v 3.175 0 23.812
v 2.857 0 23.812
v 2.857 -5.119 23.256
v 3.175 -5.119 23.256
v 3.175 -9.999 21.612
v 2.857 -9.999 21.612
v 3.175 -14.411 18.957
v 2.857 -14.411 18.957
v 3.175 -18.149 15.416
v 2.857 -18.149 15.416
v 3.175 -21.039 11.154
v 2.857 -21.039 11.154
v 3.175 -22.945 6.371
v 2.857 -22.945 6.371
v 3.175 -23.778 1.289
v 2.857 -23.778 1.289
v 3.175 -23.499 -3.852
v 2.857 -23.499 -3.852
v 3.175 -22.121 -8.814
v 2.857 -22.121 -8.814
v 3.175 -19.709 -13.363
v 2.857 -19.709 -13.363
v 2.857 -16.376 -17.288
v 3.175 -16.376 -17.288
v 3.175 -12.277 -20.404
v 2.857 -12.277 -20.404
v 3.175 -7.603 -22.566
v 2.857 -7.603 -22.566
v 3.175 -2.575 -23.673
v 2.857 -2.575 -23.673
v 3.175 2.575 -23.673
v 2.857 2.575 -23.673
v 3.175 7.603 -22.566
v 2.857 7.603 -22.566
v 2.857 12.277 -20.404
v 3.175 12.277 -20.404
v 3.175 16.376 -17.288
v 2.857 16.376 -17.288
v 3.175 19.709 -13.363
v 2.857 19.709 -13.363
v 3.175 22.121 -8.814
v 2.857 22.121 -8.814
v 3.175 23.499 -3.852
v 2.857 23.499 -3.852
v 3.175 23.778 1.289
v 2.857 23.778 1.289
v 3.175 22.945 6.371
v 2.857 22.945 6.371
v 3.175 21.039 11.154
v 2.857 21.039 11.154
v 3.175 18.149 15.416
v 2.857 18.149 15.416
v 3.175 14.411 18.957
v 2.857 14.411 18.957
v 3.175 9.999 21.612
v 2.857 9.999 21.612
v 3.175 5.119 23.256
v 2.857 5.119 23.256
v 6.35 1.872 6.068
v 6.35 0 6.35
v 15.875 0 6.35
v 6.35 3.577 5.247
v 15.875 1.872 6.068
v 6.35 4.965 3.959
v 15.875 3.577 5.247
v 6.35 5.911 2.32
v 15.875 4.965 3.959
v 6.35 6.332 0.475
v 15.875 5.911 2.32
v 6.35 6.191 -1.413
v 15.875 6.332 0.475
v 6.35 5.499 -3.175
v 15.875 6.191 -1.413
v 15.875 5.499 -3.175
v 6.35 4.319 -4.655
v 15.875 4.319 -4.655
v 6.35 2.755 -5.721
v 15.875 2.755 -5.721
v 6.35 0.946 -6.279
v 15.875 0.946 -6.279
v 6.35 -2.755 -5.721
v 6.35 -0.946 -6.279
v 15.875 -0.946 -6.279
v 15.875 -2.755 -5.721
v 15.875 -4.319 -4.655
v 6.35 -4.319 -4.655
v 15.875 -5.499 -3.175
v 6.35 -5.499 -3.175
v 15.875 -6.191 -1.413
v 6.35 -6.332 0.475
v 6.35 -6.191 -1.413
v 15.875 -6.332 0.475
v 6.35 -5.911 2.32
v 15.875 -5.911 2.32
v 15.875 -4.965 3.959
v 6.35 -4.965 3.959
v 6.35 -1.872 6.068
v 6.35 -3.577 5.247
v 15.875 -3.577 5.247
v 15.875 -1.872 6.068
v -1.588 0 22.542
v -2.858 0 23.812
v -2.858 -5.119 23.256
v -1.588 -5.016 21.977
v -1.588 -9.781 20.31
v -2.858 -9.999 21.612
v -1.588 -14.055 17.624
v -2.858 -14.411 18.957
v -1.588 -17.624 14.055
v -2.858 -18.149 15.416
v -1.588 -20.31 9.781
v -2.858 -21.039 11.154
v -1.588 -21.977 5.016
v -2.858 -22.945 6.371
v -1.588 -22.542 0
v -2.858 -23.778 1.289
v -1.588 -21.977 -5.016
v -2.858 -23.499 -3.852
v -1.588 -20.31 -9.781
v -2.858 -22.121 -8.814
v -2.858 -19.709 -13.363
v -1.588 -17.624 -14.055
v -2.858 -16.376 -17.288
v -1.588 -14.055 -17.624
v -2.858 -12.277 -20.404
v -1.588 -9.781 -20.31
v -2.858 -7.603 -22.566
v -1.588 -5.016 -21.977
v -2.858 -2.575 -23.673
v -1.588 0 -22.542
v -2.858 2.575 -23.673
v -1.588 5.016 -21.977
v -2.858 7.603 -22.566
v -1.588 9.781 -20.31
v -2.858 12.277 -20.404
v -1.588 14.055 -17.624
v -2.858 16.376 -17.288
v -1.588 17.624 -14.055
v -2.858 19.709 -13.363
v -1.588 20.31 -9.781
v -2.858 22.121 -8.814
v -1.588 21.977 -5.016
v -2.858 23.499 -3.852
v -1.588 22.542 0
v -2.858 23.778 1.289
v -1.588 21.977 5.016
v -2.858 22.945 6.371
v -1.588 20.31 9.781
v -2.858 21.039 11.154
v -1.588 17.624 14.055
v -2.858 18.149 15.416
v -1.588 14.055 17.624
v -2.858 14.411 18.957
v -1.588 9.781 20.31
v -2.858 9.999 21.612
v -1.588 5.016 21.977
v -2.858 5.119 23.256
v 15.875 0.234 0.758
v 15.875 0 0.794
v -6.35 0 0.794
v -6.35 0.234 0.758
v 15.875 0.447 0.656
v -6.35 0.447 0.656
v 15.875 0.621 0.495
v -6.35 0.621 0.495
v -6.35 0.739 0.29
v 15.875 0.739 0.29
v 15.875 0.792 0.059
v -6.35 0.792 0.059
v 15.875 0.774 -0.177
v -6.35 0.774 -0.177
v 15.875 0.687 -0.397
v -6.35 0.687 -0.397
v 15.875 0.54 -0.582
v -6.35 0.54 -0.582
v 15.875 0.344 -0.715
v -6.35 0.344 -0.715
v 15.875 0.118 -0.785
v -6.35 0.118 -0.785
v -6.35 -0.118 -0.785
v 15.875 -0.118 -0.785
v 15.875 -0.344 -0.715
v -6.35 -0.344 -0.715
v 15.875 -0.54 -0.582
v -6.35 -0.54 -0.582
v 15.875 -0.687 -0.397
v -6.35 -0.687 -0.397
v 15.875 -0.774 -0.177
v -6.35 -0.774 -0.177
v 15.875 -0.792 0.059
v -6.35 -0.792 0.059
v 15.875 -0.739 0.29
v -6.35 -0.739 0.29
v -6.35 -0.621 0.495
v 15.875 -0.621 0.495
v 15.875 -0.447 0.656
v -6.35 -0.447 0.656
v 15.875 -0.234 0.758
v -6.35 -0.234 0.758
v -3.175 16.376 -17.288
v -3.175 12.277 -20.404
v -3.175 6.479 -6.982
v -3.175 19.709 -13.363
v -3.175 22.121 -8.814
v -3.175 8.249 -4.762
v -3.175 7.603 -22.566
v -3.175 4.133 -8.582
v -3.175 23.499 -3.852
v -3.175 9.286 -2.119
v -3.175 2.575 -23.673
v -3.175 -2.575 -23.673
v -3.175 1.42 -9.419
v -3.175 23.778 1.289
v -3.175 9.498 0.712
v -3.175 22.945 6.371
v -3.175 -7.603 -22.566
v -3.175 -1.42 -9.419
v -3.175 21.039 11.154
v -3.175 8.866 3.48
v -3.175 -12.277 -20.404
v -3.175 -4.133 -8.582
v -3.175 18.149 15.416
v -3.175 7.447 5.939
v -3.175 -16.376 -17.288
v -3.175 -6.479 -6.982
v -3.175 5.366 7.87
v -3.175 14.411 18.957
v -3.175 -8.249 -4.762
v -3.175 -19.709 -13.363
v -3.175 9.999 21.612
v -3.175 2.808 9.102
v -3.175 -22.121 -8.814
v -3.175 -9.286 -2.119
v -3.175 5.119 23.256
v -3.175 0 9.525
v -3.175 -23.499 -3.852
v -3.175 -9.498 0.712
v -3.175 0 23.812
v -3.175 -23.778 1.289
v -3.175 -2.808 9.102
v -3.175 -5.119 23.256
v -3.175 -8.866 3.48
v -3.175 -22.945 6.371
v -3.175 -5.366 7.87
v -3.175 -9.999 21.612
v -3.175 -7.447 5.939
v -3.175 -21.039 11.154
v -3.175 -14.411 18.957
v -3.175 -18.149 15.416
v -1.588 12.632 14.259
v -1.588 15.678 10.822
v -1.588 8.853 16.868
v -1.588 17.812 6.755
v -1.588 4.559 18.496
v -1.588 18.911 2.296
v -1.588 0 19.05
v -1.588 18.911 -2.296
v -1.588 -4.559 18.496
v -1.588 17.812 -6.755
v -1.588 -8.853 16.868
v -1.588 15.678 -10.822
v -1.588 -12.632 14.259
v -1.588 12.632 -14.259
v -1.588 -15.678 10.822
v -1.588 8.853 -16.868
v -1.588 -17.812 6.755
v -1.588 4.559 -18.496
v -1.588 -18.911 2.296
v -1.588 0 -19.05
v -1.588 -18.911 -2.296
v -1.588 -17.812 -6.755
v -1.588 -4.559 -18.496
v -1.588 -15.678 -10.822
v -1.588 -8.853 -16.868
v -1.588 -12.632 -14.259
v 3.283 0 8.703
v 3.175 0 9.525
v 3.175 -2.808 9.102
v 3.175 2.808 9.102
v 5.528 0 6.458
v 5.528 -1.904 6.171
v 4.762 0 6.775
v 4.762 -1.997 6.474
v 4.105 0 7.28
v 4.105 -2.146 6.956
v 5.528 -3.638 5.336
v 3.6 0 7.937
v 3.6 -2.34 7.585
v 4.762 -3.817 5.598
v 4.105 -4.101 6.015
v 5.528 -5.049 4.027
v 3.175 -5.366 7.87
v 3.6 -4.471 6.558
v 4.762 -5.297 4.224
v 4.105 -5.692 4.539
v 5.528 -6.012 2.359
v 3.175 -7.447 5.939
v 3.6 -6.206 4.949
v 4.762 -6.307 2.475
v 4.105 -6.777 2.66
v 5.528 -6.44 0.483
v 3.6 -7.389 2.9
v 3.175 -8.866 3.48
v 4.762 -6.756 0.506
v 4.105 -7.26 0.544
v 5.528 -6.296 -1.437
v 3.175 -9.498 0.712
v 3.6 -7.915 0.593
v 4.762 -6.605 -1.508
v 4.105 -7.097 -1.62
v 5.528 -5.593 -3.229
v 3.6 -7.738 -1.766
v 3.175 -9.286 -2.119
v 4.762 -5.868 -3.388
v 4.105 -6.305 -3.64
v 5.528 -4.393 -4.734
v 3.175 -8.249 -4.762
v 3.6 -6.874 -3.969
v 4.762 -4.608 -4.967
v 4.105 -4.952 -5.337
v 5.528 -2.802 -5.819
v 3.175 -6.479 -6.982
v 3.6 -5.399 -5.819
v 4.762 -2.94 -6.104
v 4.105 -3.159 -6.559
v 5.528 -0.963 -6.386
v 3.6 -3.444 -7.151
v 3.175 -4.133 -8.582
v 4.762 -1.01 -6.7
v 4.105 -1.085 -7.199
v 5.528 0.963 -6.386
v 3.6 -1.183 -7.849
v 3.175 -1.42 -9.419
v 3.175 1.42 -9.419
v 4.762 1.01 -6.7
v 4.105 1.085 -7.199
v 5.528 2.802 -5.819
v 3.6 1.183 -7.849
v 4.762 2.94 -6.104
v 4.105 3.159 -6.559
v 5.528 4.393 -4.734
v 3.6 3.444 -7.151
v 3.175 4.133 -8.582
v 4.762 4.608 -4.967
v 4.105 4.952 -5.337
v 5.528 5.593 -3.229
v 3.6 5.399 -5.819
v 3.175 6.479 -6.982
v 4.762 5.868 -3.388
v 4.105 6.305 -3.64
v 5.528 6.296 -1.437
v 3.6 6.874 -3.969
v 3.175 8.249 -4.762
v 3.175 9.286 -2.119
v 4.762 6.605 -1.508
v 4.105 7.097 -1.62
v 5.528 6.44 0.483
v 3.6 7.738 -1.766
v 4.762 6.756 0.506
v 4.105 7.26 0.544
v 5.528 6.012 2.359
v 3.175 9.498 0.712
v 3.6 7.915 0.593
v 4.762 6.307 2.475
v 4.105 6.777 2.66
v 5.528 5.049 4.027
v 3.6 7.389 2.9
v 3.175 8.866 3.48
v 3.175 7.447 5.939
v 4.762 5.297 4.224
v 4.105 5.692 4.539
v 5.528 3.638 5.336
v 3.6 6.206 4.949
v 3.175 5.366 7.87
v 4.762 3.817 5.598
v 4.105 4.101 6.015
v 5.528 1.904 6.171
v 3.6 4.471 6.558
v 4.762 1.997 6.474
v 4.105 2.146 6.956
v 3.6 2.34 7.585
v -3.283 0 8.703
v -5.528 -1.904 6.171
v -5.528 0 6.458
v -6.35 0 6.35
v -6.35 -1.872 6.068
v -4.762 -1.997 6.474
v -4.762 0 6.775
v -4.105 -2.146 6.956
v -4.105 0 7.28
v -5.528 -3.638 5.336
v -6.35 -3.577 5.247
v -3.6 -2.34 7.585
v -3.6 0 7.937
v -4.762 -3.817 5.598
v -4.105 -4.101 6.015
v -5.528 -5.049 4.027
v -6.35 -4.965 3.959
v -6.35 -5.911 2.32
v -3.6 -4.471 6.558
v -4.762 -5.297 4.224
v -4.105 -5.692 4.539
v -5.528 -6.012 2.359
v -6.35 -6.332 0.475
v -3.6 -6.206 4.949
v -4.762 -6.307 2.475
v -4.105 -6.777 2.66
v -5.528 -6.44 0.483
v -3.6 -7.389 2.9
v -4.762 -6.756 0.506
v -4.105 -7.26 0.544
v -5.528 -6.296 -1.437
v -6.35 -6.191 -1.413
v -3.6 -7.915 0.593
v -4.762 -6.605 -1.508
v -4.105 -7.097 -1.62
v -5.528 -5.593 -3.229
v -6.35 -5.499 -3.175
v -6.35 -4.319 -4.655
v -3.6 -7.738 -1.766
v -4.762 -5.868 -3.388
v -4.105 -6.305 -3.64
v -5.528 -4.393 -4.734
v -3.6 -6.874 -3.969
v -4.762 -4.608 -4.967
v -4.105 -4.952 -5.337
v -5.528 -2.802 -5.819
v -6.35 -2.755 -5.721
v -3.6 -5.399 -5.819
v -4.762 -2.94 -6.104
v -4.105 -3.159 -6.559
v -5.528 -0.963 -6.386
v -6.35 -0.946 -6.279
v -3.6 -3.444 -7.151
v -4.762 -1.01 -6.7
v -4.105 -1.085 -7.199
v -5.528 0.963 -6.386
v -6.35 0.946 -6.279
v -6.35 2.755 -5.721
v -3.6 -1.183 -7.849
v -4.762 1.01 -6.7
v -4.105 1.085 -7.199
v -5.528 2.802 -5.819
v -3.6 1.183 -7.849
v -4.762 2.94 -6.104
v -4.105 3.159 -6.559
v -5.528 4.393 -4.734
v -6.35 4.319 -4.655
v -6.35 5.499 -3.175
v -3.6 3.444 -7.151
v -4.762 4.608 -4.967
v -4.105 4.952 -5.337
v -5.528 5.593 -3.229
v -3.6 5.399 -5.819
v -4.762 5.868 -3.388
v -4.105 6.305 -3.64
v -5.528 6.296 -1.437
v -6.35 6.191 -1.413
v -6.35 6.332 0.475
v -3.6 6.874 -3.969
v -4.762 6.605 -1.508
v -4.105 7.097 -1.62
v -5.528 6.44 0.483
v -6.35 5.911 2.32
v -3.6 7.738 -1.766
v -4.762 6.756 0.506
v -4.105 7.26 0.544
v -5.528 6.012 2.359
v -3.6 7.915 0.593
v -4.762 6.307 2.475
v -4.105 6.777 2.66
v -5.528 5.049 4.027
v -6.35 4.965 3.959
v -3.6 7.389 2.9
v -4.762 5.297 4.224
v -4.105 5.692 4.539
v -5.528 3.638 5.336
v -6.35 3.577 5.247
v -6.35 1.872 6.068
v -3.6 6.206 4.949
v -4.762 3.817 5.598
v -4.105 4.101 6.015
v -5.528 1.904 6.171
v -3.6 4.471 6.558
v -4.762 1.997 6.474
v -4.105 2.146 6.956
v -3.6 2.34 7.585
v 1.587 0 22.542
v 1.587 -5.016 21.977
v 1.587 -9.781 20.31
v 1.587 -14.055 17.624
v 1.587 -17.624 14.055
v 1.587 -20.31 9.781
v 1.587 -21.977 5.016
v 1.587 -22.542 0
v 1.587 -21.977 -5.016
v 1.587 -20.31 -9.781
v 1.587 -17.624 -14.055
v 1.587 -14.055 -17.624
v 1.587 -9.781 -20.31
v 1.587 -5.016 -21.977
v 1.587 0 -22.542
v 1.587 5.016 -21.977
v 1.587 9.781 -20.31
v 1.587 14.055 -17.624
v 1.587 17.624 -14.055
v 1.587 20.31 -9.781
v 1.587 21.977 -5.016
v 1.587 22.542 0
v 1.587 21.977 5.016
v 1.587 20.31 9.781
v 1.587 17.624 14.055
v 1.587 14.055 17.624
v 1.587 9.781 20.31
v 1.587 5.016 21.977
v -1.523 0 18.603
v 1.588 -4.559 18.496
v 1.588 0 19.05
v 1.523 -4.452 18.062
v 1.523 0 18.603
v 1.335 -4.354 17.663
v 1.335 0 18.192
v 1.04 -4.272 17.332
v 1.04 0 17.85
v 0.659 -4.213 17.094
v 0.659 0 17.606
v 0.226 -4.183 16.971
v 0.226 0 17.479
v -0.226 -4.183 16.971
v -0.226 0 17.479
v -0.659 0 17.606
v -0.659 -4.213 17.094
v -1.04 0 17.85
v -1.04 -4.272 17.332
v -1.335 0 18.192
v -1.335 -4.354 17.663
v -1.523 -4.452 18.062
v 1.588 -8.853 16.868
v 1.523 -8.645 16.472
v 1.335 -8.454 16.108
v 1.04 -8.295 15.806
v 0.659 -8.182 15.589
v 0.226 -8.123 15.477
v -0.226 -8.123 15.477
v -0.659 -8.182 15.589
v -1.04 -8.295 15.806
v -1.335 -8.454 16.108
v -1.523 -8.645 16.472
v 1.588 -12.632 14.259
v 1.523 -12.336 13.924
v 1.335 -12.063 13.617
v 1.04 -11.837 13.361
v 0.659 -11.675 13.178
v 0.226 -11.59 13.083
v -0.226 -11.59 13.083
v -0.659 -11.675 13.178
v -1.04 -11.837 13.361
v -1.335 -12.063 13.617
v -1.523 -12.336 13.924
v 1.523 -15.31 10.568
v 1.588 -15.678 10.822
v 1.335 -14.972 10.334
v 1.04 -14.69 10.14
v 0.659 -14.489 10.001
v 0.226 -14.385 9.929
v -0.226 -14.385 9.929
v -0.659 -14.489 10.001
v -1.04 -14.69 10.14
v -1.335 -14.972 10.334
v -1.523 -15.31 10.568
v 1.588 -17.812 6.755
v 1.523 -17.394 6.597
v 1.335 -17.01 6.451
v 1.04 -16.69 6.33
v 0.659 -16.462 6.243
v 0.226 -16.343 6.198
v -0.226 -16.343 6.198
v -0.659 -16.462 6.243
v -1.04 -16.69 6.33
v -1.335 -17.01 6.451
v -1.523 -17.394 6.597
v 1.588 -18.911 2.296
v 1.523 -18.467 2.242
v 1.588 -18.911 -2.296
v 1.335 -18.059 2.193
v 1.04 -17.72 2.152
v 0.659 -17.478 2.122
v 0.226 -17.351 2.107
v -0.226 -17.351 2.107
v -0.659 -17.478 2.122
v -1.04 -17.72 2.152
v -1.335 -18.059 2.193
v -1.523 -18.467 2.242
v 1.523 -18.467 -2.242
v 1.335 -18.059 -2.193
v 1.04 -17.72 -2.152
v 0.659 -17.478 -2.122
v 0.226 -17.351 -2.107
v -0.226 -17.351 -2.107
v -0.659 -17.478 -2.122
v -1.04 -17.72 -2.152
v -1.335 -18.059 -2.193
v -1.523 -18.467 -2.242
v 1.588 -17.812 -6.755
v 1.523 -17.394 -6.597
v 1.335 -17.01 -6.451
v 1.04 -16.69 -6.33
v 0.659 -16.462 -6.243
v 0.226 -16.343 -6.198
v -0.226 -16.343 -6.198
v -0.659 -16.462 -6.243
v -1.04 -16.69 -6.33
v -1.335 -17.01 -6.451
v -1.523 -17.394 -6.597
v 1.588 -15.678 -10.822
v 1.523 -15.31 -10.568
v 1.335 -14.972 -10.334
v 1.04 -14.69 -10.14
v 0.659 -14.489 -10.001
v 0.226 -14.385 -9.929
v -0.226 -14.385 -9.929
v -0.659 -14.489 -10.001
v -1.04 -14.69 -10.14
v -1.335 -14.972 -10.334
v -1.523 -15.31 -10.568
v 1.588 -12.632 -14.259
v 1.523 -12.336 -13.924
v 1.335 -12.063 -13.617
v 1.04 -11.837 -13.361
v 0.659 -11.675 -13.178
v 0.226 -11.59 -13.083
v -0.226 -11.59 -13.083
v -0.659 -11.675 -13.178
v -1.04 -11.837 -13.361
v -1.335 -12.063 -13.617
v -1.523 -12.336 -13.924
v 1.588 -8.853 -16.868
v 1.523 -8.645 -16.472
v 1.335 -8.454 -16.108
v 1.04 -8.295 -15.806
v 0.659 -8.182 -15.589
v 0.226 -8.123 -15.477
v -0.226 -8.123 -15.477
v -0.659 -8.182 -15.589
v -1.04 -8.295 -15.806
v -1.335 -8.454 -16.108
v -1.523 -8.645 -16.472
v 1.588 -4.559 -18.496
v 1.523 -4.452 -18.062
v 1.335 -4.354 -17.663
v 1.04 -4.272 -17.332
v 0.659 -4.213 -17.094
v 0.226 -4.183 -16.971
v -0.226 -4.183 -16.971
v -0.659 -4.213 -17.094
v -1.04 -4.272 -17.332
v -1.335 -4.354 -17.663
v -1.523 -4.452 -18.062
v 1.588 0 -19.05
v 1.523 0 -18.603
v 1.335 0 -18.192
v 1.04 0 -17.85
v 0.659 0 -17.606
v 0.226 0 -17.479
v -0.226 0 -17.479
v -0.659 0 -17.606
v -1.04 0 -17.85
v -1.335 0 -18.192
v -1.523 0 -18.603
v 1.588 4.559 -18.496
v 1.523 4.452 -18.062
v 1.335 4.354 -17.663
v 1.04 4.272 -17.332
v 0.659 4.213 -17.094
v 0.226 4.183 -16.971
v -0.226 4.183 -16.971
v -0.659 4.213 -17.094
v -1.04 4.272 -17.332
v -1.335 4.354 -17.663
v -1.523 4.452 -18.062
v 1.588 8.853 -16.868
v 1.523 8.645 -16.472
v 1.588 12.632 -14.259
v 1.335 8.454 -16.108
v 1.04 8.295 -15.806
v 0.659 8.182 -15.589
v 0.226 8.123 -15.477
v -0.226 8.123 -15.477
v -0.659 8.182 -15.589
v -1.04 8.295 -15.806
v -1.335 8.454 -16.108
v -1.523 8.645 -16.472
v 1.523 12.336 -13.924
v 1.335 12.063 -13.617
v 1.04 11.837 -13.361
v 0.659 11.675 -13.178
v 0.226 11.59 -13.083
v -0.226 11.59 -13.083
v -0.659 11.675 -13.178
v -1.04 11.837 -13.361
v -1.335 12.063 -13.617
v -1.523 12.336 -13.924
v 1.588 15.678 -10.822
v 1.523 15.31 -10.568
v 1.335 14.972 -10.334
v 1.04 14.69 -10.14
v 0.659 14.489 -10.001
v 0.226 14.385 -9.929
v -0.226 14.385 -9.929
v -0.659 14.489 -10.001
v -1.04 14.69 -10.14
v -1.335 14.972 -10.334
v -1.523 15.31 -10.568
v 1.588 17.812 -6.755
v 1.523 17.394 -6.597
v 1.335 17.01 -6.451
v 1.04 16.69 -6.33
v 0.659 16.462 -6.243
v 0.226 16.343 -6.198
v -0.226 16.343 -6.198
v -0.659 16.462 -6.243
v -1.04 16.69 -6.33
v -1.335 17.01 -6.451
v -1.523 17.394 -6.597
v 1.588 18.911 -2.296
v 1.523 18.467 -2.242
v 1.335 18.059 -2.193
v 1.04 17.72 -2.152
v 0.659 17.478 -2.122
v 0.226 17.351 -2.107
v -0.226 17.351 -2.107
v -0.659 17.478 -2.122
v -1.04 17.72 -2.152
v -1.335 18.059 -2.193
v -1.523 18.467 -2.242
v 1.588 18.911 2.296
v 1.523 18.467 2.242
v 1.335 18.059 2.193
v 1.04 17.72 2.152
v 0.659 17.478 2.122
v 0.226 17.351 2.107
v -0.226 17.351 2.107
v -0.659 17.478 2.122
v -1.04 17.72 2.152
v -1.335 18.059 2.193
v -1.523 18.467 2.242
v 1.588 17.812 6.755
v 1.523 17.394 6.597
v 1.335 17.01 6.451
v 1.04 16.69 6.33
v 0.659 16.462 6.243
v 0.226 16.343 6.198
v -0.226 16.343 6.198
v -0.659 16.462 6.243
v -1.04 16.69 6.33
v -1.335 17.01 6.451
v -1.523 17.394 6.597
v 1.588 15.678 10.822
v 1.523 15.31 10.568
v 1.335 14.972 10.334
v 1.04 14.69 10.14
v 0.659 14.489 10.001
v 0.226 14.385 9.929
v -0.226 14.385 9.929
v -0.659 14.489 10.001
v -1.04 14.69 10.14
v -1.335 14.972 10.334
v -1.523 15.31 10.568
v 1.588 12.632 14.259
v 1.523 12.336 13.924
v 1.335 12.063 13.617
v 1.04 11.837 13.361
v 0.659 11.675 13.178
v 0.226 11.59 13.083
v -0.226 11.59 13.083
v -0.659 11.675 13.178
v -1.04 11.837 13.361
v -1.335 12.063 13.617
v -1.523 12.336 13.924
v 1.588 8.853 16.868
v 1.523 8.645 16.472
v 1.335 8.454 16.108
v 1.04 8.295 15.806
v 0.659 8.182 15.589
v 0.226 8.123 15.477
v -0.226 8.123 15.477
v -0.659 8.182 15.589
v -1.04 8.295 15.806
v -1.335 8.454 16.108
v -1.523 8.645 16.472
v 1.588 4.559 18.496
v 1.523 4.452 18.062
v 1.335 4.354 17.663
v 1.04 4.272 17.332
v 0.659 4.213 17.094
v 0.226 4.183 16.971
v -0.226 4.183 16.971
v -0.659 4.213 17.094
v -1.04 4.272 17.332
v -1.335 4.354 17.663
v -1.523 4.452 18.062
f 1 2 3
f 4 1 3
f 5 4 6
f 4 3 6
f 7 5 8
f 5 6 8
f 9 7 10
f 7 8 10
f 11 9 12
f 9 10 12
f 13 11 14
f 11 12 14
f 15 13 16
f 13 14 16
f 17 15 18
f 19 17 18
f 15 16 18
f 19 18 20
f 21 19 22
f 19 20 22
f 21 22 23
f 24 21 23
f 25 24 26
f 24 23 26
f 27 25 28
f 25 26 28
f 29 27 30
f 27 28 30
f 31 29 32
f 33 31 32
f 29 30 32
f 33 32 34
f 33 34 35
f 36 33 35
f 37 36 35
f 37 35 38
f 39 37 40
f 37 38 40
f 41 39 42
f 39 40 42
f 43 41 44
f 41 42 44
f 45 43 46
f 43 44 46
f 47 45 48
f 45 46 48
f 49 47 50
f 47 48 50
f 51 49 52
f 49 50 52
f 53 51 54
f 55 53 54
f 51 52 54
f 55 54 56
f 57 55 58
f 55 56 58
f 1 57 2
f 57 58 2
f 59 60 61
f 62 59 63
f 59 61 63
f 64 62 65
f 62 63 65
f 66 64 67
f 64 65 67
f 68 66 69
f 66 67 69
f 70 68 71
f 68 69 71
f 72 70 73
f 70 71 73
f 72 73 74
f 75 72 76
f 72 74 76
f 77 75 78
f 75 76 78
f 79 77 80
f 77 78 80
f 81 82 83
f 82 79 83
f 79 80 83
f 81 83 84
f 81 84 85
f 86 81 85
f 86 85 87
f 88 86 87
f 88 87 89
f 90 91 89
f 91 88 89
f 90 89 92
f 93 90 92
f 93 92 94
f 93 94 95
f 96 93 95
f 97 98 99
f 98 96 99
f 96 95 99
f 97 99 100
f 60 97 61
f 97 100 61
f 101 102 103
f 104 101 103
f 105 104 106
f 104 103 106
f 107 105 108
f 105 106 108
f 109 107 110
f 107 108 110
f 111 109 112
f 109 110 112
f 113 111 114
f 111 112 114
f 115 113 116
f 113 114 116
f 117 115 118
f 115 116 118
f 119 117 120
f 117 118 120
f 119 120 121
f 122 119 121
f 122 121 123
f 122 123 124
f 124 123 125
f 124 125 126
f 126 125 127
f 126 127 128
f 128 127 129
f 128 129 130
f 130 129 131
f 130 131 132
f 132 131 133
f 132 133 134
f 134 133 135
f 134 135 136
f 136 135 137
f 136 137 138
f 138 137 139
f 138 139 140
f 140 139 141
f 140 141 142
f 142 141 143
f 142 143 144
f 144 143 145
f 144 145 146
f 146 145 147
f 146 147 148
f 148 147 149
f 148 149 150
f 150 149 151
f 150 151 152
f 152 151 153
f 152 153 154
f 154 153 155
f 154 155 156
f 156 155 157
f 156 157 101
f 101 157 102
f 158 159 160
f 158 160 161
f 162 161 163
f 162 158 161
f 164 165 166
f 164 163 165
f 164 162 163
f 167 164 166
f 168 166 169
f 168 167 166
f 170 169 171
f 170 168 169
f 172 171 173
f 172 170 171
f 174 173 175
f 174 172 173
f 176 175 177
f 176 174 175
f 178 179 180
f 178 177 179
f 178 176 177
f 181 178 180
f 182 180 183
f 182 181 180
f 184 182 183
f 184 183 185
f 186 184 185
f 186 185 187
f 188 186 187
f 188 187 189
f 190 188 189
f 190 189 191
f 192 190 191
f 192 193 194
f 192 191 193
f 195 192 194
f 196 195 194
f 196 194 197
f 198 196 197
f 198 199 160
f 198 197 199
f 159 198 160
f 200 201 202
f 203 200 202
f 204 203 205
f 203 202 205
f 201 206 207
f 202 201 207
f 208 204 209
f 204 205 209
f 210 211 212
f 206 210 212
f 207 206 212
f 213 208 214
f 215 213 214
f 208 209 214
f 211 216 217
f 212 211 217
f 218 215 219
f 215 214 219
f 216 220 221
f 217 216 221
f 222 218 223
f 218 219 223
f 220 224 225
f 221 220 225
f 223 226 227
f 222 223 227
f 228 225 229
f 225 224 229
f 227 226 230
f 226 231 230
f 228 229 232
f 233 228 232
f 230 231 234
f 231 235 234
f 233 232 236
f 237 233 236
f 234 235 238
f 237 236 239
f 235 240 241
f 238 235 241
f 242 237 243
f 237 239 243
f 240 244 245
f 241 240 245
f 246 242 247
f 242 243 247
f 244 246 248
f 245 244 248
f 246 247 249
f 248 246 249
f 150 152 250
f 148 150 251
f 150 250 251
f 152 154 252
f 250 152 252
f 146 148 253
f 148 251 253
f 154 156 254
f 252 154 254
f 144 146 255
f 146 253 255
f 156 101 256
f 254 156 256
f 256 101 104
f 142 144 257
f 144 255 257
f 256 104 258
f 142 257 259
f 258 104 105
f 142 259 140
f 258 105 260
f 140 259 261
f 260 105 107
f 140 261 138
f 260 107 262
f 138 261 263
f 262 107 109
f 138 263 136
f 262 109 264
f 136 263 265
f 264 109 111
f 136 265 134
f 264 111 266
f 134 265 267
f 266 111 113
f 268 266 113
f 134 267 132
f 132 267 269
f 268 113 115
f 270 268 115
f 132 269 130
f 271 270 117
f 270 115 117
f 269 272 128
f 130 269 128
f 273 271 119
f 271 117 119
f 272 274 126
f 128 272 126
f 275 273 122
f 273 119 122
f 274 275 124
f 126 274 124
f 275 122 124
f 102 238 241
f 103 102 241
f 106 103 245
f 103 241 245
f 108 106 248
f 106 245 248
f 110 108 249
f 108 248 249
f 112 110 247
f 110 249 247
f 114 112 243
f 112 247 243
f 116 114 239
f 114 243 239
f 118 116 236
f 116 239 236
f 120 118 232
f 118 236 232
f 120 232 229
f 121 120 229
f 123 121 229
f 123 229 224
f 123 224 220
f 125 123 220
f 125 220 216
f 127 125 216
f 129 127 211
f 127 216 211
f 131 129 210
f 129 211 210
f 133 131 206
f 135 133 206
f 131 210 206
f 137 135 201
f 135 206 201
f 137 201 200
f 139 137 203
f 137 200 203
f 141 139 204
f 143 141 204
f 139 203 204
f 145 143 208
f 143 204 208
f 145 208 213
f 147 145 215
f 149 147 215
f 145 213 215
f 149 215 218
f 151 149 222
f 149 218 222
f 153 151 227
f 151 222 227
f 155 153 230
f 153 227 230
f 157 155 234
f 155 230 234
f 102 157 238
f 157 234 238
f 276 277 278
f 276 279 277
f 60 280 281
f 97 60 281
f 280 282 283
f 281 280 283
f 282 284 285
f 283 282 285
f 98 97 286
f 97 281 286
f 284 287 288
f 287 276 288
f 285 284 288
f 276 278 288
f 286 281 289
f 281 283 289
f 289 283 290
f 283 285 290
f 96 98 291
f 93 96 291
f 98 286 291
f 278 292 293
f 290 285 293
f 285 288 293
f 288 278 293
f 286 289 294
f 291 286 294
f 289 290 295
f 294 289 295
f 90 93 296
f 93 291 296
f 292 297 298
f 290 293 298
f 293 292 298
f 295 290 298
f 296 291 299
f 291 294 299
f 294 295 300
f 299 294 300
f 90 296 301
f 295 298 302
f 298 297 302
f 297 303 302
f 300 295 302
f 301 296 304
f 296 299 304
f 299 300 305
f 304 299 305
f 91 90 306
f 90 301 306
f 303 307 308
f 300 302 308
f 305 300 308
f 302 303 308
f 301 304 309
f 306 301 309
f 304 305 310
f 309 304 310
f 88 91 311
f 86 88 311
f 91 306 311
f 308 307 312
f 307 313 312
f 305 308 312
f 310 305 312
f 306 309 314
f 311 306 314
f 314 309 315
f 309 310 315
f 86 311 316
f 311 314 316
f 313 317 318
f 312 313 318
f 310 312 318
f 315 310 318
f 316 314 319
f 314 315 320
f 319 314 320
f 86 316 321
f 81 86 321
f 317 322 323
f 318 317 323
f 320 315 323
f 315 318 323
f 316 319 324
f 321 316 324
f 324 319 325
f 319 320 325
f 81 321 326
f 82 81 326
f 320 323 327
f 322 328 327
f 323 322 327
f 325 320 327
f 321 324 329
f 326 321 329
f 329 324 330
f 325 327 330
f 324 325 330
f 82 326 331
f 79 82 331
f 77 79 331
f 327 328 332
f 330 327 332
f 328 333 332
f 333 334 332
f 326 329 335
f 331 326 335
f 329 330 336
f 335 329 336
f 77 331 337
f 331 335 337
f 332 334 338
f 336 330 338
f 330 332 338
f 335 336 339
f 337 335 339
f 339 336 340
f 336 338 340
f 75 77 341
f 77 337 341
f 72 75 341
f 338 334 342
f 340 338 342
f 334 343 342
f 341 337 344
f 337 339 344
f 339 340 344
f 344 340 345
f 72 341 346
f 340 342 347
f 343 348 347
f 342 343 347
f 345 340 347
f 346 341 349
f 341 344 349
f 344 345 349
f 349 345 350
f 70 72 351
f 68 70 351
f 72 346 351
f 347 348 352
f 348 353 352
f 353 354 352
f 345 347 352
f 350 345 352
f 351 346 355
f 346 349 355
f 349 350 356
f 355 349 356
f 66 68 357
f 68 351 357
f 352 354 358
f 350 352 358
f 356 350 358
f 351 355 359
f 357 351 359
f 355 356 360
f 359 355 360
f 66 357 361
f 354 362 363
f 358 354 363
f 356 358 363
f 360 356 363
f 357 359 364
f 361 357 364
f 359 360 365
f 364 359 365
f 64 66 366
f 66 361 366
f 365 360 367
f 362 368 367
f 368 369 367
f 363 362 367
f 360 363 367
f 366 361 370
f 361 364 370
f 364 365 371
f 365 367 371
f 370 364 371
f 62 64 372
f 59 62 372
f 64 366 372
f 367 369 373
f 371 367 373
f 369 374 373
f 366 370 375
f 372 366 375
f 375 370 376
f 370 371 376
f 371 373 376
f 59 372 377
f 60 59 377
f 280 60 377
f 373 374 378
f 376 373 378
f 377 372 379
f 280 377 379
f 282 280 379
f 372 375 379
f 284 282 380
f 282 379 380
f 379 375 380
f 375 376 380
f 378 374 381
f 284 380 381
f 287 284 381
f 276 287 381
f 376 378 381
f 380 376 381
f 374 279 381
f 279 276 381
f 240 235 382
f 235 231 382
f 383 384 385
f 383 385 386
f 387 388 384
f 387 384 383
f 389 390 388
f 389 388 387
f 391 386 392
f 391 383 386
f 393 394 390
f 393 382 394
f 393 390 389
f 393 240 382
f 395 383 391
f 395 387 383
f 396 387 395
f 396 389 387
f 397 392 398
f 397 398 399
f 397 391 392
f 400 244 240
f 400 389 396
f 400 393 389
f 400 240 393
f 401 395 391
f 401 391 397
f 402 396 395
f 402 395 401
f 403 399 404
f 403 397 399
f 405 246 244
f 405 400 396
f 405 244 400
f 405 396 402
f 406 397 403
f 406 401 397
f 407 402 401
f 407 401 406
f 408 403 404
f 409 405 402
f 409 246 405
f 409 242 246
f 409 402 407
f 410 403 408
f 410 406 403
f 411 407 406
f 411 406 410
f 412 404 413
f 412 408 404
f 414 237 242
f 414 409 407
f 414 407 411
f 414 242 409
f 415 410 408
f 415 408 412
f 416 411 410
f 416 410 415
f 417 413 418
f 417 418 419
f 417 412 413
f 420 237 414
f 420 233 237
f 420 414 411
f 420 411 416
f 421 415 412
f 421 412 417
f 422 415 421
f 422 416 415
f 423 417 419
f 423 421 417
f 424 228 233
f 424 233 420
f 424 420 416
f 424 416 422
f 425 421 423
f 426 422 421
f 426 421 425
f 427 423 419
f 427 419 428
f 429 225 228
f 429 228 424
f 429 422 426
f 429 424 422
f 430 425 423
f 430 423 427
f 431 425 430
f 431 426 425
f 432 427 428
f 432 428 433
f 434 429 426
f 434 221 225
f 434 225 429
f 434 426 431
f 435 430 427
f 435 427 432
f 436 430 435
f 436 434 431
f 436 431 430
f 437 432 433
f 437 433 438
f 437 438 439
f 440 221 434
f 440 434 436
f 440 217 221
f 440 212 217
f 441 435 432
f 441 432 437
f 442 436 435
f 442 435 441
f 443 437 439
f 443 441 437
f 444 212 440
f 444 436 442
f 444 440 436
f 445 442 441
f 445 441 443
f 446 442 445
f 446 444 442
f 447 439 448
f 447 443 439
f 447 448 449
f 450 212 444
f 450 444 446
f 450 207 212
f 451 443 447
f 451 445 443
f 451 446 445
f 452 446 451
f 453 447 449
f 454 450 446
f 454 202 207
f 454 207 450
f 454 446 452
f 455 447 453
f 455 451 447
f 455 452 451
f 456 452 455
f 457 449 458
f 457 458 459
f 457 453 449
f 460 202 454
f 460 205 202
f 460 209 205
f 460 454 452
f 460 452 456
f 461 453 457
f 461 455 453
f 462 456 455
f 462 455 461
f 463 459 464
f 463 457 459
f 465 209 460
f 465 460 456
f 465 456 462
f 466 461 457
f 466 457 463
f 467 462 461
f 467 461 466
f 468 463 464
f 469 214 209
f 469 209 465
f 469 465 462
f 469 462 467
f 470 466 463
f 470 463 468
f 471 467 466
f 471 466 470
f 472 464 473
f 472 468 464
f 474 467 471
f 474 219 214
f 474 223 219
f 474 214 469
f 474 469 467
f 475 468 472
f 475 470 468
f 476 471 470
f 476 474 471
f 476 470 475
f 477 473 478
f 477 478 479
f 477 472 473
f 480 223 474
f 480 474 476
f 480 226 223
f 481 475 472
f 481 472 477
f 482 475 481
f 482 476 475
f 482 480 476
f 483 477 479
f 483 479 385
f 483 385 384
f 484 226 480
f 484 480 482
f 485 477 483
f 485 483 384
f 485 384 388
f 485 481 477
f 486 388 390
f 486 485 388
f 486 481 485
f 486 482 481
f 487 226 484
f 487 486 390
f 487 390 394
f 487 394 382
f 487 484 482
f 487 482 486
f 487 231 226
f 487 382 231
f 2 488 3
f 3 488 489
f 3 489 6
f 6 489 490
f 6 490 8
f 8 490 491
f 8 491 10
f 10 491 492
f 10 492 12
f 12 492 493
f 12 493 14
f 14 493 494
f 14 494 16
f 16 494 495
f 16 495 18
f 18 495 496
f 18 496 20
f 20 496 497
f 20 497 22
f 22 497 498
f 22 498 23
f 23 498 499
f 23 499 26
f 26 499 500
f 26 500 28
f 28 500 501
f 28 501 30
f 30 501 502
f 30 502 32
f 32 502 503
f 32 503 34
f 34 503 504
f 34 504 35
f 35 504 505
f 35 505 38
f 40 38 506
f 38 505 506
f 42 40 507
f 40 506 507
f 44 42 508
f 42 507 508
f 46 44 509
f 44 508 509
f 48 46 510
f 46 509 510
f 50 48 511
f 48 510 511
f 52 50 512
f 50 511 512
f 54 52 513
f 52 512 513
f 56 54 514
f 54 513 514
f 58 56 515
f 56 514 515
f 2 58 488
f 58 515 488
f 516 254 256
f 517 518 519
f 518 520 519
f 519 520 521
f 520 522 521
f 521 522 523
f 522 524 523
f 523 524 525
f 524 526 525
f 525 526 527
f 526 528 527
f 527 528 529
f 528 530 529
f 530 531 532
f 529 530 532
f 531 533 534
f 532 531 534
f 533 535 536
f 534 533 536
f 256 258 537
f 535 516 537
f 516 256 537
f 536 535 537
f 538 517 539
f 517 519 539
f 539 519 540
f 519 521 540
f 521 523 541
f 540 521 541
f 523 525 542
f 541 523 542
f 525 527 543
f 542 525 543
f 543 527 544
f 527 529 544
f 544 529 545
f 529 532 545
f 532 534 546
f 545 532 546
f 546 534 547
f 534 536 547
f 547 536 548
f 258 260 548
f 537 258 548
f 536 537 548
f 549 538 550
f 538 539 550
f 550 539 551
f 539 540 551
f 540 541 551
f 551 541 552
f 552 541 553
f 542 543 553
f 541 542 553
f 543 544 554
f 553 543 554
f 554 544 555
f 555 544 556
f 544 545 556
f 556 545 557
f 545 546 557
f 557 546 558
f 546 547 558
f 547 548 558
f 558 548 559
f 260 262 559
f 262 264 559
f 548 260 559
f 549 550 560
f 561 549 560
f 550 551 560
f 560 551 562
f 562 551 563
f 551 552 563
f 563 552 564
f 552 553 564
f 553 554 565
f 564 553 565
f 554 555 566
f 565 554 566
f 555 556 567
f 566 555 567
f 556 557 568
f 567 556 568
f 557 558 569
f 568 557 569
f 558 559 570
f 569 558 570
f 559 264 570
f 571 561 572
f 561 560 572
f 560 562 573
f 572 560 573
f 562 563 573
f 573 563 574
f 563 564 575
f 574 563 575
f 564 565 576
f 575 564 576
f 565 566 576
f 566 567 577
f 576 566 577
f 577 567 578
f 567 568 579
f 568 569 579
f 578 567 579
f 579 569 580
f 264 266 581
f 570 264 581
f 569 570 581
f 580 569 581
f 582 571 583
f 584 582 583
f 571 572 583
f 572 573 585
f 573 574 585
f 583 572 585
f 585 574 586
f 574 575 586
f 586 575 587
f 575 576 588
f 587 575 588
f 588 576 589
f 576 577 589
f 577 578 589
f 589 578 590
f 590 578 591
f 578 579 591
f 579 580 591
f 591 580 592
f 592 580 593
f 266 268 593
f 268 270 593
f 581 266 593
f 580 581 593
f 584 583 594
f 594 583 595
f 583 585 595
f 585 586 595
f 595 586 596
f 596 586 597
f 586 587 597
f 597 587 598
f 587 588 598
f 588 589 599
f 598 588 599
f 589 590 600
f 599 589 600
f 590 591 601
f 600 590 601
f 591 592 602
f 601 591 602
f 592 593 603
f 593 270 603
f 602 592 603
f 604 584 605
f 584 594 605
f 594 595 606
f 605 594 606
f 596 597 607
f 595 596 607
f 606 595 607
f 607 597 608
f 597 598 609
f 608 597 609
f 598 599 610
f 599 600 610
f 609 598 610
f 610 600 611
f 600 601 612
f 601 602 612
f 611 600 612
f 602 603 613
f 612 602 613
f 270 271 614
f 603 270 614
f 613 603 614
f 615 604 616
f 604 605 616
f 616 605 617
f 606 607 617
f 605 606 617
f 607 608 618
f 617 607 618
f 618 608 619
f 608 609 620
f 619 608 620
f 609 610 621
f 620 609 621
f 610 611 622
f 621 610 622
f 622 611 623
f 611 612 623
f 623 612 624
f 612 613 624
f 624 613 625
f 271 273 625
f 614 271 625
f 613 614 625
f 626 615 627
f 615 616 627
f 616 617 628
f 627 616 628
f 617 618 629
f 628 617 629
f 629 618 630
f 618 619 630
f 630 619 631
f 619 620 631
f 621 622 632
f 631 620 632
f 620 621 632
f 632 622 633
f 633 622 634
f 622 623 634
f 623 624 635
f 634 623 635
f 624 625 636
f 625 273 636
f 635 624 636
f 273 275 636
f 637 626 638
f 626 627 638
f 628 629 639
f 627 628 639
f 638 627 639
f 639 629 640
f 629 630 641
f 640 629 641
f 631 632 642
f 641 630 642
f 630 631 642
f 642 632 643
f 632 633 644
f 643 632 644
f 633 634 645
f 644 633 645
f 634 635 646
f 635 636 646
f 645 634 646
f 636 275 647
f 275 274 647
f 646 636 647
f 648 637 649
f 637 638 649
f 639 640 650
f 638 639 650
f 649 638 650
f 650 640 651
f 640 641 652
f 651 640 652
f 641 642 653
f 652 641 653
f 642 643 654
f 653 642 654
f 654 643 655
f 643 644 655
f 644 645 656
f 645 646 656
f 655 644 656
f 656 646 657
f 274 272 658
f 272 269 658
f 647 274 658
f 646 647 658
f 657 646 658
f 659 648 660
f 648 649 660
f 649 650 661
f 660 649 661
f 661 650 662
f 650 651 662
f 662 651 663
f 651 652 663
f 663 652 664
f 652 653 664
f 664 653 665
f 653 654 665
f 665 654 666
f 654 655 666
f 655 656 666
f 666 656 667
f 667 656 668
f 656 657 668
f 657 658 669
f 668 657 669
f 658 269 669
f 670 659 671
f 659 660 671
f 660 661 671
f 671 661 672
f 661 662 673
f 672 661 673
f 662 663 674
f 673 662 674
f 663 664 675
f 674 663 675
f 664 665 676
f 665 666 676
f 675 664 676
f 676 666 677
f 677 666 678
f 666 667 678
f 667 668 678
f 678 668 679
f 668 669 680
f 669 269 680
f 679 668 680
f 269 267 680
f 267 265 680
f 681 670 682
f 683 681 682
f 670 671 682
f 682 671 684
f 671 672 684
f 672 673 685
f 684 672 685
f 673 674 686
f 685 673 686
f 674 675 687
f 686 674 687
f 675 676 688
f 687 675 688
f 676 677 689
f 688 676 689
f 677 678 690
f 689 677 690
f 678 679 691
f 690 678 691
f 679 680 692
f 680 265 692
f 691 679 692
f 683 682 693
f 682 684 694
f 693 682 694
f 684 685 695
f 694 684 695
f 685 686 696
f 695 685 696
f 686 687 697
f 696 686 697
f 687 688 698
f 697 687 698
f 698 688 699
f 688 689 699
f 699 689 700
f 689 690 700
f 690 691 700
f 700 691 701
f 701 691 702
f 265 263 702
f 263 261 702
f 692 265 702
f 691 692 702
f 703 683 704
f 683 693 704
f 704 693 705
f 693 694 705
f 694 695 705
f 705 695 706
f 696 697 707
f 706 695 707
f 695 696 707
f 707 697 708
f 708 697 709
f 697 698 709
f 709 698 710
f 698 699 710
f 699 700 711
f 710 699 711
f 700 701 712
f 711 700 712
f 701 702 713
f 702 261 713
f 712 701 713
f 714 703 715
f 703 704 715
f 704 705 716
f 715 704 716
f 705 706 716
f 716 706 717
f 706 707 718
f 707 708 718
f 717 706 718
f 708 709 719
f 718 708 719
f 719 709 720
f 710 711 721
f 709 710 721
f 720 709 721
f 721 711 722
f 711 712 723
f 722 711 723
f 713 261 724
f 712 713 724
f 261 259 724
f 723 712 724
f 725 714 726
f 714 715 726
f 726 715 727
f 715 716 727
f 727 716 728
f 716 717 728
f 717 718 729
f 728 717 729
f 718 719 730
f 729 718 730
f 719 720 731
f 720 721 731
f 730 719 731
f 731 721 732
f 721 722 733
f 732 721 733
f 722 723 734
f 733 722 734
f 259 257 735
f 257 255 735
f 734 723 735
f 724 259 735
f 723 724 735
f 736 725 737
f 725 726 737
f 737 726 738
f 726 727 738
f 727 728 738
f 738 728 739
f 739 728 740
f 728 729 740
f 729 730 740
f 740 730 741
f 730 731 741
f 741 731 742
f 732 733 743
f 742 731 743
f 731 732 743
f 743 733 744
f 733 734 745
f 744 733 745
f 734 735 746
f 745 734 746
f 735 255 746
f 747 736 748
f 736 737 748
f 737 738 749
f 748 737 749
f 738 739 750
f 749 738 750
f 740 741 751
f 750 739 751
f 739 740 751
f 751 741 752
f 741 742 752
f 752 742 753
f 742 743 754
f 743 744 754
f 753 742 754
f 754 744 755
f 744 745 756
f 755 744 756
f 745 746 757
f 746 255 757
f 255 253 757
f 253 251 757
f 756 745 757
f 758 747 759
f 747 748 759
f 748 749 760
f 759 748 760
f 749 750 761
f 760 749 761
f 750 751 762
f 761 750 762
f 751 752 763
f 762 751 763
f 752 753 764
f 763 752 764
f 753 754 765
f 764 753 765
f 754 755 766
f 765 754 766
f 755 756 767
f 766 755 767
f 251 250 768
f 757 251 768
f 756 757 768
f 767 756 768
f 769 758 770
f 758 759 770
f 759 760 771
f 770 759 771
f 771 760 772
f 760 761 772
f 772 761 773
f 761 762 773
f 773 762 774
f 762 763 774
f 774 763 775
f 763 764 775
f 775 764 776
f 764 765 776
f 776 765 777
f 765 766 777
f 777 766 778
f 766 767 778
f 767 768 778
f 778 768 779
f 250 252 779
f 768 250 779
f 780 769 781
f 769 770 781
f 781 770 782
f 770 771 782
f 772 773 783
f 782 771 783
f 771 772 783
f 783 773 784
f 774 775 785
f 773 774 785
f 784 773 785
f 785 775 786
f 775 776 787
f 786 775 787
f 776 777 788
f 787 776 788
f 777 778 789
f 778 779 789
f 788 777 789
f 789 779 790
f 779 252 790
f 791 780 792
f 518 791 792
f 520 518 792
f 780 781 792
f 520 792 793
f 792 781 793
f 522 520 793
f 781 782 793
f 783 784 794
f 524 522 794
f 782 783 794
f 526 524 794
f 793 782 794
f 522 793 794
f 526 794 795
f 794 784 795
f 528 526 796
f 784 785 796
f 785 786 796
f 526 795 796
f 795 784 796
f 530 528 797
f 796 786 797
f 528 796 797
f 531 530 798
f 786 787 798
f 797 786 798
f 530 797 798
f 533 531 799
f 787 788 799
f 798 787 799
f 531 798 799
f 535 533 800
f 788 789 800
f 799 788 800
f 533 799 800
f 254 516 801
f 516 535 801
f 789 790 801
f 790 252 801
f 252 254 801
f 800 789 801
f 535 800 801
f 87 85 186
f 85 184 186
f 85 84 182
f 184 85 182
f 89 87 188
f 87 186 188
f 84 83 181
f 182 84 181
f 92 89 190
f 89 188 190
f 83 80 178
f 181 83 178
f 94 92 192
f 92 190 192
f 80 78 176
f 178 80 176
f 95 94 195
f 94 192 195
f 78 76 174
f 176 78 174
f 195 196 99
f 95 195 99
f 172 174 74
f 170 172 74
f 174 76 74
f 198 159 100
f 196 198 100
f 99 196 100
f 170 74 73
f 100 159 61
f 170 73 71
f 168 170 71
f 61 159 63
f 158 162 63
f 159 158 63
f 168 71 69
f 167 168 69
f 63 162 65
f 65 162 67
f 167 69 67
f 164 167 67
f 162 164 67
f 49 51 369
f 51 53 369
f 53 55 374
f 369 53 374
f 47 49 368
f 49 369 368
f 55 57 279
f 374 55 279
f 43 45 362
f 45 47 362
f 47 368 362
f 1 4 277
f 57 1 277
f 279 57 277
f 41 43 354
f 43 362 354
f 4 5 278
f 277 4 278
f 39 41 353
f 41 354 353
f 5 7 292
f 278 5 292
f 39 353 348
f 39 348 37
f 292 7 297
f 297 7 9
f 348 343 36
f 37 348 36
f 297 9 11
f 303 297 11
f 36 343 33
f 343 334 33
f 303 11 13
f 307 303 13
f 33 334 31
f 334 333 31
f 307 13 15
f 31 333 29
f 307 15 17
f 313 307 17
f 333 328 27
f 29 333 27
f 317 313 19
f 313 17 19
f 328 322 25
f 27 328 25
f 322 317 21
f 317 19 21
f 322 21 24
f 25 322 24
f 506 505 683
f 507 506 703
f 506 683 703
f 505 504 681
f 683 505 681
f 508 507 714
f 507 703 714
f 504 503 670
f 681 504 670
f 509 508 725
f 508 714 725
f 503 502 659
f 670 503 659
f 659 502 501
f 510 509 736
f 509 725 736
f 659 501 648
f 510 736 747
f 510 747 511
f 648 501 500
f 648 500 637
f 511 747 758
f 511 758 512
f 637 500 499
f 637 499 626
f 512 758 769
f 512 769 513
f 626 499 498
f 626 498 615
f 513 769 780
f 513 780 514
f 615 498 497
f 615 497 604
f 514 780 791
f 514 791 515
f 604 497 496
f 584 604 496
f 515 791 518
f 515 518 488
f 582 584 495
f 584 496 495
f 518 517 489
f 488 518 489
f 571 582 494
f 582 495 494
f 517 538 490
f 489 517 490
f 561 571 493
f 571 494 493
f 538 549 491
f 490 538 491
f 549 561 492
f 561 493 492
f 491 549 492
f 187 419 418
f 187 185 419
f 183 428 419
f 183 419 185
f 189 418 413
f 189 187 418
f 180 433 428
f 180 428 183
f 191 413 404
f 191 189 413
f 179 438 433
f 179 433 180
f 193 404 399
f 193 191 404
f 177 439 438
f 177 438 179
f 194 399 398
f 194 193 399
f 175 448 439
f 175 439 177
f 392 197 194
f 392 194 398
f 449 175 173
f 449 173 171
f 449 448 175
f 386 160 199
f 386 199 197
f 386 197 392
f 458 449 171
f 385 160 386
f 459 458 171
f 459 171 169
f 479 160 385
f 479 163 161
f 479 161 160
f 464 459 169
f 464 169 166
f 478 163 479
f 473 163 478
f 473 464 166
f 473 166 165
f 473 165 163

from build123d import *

# Parameters (mm, degrees)
BOSS_EXTRUDE1_DEPTH      = 3.175
BOSS_EXTRUDE1_DEPTH_BACK = 19.05
SKETCH2_R                = 6.35
CUT_EXTRUDE1_DEPTH       = 41.348741461
CUT_EXTRUDE1_DEPTH_BACK  = 41.348741461
SKETCH3_R                = 0.79375
FILLET1_R                = 3.175
CHAMFER1_SIZE            = 1.27


with BuildPart() as part:
    # Sketch1 → Revolve1 (revolve)
    with BuildSketch(Plane.XY, mode=Mode.PRIVATE) as revolve1_sk:
        with BuildLine():
            Line((-1.5875, -19.05), (-1.5875, -23.8125))
            Line((-1.5875, -23.8125), (-3.175, -23.8125))
            Line((-3.175, -23.8125), (-3.175, 0))
            Line((-3.175, 0), (3.175, 0))
            Line((3.175, 0), (3.175, -23.8125))
            Line((3.175, -23.8125), (1.5875, -23.8125))
            Line((1.5875, -23.8125), (1.5875, -19.05))
            ThreePointArc((1.5875, -19.05), (0, -17.4625), (-1.5875, -19.05))
        make_face()
    revolve(revolve1_sk.sketch.rotate(Axis((-3.175, 0, 0), (1, 0, 0)), 270), axis=Axis((-3.175, 0, 0), (1, 0, 0)))

    # Sketch2 → Boss-Extrude1 (add, two sides: drawn at the far end of the back side and taken through both)
    with BuildSketch(Plane.ZY.offset(3.175).offset(-BOSS_EXTRUDE1_DEPTH_BACK)):
        Circle(SKETCH2_R)
    extrude(amount=BOSS_EXTRUDE1_DEPTH + BOSS_EXTRUDE1_DEPTH_BACK)

    # Sketch3 → Cut-Extrude1 (cut, two sides: drawn at the far end of the back side and taken through both)
    with BuildSketch(Plane.ZY.offset(6.35).offset(-CUT_EXTRUDE1_DEPTH_BACK)):
        Circle(SKETCH3_R)
    extrude(amount=CUT_EXTRUDE1_DEPTH + CUT_EXTRUDE1_DEPTH_BACK, mode=Mode.SUBTRACT)

    # Fillet1
    fillet1_edges = [part.edges().sort_by_distance(p)[0] for p in [
        (-3.175, 0, -6.35),
        (3.175, 0, -6.35),
    ]]
    fillet(fillet1_edges, radius=FILLET1_R - 0.0001)  # a hair under: the kernel refuses the full size

    # Chamfer1
    chamfer1_edges = [part.edges().sort_by_distance(p)[0] for p in [
        (-1.5875, 0, -23.8125),
        (1.5875, 0, -23.8125),
    ]]
    chamfer(chamfer1_edges, length=CHAMFER1_SIZE)


solid = part.part
